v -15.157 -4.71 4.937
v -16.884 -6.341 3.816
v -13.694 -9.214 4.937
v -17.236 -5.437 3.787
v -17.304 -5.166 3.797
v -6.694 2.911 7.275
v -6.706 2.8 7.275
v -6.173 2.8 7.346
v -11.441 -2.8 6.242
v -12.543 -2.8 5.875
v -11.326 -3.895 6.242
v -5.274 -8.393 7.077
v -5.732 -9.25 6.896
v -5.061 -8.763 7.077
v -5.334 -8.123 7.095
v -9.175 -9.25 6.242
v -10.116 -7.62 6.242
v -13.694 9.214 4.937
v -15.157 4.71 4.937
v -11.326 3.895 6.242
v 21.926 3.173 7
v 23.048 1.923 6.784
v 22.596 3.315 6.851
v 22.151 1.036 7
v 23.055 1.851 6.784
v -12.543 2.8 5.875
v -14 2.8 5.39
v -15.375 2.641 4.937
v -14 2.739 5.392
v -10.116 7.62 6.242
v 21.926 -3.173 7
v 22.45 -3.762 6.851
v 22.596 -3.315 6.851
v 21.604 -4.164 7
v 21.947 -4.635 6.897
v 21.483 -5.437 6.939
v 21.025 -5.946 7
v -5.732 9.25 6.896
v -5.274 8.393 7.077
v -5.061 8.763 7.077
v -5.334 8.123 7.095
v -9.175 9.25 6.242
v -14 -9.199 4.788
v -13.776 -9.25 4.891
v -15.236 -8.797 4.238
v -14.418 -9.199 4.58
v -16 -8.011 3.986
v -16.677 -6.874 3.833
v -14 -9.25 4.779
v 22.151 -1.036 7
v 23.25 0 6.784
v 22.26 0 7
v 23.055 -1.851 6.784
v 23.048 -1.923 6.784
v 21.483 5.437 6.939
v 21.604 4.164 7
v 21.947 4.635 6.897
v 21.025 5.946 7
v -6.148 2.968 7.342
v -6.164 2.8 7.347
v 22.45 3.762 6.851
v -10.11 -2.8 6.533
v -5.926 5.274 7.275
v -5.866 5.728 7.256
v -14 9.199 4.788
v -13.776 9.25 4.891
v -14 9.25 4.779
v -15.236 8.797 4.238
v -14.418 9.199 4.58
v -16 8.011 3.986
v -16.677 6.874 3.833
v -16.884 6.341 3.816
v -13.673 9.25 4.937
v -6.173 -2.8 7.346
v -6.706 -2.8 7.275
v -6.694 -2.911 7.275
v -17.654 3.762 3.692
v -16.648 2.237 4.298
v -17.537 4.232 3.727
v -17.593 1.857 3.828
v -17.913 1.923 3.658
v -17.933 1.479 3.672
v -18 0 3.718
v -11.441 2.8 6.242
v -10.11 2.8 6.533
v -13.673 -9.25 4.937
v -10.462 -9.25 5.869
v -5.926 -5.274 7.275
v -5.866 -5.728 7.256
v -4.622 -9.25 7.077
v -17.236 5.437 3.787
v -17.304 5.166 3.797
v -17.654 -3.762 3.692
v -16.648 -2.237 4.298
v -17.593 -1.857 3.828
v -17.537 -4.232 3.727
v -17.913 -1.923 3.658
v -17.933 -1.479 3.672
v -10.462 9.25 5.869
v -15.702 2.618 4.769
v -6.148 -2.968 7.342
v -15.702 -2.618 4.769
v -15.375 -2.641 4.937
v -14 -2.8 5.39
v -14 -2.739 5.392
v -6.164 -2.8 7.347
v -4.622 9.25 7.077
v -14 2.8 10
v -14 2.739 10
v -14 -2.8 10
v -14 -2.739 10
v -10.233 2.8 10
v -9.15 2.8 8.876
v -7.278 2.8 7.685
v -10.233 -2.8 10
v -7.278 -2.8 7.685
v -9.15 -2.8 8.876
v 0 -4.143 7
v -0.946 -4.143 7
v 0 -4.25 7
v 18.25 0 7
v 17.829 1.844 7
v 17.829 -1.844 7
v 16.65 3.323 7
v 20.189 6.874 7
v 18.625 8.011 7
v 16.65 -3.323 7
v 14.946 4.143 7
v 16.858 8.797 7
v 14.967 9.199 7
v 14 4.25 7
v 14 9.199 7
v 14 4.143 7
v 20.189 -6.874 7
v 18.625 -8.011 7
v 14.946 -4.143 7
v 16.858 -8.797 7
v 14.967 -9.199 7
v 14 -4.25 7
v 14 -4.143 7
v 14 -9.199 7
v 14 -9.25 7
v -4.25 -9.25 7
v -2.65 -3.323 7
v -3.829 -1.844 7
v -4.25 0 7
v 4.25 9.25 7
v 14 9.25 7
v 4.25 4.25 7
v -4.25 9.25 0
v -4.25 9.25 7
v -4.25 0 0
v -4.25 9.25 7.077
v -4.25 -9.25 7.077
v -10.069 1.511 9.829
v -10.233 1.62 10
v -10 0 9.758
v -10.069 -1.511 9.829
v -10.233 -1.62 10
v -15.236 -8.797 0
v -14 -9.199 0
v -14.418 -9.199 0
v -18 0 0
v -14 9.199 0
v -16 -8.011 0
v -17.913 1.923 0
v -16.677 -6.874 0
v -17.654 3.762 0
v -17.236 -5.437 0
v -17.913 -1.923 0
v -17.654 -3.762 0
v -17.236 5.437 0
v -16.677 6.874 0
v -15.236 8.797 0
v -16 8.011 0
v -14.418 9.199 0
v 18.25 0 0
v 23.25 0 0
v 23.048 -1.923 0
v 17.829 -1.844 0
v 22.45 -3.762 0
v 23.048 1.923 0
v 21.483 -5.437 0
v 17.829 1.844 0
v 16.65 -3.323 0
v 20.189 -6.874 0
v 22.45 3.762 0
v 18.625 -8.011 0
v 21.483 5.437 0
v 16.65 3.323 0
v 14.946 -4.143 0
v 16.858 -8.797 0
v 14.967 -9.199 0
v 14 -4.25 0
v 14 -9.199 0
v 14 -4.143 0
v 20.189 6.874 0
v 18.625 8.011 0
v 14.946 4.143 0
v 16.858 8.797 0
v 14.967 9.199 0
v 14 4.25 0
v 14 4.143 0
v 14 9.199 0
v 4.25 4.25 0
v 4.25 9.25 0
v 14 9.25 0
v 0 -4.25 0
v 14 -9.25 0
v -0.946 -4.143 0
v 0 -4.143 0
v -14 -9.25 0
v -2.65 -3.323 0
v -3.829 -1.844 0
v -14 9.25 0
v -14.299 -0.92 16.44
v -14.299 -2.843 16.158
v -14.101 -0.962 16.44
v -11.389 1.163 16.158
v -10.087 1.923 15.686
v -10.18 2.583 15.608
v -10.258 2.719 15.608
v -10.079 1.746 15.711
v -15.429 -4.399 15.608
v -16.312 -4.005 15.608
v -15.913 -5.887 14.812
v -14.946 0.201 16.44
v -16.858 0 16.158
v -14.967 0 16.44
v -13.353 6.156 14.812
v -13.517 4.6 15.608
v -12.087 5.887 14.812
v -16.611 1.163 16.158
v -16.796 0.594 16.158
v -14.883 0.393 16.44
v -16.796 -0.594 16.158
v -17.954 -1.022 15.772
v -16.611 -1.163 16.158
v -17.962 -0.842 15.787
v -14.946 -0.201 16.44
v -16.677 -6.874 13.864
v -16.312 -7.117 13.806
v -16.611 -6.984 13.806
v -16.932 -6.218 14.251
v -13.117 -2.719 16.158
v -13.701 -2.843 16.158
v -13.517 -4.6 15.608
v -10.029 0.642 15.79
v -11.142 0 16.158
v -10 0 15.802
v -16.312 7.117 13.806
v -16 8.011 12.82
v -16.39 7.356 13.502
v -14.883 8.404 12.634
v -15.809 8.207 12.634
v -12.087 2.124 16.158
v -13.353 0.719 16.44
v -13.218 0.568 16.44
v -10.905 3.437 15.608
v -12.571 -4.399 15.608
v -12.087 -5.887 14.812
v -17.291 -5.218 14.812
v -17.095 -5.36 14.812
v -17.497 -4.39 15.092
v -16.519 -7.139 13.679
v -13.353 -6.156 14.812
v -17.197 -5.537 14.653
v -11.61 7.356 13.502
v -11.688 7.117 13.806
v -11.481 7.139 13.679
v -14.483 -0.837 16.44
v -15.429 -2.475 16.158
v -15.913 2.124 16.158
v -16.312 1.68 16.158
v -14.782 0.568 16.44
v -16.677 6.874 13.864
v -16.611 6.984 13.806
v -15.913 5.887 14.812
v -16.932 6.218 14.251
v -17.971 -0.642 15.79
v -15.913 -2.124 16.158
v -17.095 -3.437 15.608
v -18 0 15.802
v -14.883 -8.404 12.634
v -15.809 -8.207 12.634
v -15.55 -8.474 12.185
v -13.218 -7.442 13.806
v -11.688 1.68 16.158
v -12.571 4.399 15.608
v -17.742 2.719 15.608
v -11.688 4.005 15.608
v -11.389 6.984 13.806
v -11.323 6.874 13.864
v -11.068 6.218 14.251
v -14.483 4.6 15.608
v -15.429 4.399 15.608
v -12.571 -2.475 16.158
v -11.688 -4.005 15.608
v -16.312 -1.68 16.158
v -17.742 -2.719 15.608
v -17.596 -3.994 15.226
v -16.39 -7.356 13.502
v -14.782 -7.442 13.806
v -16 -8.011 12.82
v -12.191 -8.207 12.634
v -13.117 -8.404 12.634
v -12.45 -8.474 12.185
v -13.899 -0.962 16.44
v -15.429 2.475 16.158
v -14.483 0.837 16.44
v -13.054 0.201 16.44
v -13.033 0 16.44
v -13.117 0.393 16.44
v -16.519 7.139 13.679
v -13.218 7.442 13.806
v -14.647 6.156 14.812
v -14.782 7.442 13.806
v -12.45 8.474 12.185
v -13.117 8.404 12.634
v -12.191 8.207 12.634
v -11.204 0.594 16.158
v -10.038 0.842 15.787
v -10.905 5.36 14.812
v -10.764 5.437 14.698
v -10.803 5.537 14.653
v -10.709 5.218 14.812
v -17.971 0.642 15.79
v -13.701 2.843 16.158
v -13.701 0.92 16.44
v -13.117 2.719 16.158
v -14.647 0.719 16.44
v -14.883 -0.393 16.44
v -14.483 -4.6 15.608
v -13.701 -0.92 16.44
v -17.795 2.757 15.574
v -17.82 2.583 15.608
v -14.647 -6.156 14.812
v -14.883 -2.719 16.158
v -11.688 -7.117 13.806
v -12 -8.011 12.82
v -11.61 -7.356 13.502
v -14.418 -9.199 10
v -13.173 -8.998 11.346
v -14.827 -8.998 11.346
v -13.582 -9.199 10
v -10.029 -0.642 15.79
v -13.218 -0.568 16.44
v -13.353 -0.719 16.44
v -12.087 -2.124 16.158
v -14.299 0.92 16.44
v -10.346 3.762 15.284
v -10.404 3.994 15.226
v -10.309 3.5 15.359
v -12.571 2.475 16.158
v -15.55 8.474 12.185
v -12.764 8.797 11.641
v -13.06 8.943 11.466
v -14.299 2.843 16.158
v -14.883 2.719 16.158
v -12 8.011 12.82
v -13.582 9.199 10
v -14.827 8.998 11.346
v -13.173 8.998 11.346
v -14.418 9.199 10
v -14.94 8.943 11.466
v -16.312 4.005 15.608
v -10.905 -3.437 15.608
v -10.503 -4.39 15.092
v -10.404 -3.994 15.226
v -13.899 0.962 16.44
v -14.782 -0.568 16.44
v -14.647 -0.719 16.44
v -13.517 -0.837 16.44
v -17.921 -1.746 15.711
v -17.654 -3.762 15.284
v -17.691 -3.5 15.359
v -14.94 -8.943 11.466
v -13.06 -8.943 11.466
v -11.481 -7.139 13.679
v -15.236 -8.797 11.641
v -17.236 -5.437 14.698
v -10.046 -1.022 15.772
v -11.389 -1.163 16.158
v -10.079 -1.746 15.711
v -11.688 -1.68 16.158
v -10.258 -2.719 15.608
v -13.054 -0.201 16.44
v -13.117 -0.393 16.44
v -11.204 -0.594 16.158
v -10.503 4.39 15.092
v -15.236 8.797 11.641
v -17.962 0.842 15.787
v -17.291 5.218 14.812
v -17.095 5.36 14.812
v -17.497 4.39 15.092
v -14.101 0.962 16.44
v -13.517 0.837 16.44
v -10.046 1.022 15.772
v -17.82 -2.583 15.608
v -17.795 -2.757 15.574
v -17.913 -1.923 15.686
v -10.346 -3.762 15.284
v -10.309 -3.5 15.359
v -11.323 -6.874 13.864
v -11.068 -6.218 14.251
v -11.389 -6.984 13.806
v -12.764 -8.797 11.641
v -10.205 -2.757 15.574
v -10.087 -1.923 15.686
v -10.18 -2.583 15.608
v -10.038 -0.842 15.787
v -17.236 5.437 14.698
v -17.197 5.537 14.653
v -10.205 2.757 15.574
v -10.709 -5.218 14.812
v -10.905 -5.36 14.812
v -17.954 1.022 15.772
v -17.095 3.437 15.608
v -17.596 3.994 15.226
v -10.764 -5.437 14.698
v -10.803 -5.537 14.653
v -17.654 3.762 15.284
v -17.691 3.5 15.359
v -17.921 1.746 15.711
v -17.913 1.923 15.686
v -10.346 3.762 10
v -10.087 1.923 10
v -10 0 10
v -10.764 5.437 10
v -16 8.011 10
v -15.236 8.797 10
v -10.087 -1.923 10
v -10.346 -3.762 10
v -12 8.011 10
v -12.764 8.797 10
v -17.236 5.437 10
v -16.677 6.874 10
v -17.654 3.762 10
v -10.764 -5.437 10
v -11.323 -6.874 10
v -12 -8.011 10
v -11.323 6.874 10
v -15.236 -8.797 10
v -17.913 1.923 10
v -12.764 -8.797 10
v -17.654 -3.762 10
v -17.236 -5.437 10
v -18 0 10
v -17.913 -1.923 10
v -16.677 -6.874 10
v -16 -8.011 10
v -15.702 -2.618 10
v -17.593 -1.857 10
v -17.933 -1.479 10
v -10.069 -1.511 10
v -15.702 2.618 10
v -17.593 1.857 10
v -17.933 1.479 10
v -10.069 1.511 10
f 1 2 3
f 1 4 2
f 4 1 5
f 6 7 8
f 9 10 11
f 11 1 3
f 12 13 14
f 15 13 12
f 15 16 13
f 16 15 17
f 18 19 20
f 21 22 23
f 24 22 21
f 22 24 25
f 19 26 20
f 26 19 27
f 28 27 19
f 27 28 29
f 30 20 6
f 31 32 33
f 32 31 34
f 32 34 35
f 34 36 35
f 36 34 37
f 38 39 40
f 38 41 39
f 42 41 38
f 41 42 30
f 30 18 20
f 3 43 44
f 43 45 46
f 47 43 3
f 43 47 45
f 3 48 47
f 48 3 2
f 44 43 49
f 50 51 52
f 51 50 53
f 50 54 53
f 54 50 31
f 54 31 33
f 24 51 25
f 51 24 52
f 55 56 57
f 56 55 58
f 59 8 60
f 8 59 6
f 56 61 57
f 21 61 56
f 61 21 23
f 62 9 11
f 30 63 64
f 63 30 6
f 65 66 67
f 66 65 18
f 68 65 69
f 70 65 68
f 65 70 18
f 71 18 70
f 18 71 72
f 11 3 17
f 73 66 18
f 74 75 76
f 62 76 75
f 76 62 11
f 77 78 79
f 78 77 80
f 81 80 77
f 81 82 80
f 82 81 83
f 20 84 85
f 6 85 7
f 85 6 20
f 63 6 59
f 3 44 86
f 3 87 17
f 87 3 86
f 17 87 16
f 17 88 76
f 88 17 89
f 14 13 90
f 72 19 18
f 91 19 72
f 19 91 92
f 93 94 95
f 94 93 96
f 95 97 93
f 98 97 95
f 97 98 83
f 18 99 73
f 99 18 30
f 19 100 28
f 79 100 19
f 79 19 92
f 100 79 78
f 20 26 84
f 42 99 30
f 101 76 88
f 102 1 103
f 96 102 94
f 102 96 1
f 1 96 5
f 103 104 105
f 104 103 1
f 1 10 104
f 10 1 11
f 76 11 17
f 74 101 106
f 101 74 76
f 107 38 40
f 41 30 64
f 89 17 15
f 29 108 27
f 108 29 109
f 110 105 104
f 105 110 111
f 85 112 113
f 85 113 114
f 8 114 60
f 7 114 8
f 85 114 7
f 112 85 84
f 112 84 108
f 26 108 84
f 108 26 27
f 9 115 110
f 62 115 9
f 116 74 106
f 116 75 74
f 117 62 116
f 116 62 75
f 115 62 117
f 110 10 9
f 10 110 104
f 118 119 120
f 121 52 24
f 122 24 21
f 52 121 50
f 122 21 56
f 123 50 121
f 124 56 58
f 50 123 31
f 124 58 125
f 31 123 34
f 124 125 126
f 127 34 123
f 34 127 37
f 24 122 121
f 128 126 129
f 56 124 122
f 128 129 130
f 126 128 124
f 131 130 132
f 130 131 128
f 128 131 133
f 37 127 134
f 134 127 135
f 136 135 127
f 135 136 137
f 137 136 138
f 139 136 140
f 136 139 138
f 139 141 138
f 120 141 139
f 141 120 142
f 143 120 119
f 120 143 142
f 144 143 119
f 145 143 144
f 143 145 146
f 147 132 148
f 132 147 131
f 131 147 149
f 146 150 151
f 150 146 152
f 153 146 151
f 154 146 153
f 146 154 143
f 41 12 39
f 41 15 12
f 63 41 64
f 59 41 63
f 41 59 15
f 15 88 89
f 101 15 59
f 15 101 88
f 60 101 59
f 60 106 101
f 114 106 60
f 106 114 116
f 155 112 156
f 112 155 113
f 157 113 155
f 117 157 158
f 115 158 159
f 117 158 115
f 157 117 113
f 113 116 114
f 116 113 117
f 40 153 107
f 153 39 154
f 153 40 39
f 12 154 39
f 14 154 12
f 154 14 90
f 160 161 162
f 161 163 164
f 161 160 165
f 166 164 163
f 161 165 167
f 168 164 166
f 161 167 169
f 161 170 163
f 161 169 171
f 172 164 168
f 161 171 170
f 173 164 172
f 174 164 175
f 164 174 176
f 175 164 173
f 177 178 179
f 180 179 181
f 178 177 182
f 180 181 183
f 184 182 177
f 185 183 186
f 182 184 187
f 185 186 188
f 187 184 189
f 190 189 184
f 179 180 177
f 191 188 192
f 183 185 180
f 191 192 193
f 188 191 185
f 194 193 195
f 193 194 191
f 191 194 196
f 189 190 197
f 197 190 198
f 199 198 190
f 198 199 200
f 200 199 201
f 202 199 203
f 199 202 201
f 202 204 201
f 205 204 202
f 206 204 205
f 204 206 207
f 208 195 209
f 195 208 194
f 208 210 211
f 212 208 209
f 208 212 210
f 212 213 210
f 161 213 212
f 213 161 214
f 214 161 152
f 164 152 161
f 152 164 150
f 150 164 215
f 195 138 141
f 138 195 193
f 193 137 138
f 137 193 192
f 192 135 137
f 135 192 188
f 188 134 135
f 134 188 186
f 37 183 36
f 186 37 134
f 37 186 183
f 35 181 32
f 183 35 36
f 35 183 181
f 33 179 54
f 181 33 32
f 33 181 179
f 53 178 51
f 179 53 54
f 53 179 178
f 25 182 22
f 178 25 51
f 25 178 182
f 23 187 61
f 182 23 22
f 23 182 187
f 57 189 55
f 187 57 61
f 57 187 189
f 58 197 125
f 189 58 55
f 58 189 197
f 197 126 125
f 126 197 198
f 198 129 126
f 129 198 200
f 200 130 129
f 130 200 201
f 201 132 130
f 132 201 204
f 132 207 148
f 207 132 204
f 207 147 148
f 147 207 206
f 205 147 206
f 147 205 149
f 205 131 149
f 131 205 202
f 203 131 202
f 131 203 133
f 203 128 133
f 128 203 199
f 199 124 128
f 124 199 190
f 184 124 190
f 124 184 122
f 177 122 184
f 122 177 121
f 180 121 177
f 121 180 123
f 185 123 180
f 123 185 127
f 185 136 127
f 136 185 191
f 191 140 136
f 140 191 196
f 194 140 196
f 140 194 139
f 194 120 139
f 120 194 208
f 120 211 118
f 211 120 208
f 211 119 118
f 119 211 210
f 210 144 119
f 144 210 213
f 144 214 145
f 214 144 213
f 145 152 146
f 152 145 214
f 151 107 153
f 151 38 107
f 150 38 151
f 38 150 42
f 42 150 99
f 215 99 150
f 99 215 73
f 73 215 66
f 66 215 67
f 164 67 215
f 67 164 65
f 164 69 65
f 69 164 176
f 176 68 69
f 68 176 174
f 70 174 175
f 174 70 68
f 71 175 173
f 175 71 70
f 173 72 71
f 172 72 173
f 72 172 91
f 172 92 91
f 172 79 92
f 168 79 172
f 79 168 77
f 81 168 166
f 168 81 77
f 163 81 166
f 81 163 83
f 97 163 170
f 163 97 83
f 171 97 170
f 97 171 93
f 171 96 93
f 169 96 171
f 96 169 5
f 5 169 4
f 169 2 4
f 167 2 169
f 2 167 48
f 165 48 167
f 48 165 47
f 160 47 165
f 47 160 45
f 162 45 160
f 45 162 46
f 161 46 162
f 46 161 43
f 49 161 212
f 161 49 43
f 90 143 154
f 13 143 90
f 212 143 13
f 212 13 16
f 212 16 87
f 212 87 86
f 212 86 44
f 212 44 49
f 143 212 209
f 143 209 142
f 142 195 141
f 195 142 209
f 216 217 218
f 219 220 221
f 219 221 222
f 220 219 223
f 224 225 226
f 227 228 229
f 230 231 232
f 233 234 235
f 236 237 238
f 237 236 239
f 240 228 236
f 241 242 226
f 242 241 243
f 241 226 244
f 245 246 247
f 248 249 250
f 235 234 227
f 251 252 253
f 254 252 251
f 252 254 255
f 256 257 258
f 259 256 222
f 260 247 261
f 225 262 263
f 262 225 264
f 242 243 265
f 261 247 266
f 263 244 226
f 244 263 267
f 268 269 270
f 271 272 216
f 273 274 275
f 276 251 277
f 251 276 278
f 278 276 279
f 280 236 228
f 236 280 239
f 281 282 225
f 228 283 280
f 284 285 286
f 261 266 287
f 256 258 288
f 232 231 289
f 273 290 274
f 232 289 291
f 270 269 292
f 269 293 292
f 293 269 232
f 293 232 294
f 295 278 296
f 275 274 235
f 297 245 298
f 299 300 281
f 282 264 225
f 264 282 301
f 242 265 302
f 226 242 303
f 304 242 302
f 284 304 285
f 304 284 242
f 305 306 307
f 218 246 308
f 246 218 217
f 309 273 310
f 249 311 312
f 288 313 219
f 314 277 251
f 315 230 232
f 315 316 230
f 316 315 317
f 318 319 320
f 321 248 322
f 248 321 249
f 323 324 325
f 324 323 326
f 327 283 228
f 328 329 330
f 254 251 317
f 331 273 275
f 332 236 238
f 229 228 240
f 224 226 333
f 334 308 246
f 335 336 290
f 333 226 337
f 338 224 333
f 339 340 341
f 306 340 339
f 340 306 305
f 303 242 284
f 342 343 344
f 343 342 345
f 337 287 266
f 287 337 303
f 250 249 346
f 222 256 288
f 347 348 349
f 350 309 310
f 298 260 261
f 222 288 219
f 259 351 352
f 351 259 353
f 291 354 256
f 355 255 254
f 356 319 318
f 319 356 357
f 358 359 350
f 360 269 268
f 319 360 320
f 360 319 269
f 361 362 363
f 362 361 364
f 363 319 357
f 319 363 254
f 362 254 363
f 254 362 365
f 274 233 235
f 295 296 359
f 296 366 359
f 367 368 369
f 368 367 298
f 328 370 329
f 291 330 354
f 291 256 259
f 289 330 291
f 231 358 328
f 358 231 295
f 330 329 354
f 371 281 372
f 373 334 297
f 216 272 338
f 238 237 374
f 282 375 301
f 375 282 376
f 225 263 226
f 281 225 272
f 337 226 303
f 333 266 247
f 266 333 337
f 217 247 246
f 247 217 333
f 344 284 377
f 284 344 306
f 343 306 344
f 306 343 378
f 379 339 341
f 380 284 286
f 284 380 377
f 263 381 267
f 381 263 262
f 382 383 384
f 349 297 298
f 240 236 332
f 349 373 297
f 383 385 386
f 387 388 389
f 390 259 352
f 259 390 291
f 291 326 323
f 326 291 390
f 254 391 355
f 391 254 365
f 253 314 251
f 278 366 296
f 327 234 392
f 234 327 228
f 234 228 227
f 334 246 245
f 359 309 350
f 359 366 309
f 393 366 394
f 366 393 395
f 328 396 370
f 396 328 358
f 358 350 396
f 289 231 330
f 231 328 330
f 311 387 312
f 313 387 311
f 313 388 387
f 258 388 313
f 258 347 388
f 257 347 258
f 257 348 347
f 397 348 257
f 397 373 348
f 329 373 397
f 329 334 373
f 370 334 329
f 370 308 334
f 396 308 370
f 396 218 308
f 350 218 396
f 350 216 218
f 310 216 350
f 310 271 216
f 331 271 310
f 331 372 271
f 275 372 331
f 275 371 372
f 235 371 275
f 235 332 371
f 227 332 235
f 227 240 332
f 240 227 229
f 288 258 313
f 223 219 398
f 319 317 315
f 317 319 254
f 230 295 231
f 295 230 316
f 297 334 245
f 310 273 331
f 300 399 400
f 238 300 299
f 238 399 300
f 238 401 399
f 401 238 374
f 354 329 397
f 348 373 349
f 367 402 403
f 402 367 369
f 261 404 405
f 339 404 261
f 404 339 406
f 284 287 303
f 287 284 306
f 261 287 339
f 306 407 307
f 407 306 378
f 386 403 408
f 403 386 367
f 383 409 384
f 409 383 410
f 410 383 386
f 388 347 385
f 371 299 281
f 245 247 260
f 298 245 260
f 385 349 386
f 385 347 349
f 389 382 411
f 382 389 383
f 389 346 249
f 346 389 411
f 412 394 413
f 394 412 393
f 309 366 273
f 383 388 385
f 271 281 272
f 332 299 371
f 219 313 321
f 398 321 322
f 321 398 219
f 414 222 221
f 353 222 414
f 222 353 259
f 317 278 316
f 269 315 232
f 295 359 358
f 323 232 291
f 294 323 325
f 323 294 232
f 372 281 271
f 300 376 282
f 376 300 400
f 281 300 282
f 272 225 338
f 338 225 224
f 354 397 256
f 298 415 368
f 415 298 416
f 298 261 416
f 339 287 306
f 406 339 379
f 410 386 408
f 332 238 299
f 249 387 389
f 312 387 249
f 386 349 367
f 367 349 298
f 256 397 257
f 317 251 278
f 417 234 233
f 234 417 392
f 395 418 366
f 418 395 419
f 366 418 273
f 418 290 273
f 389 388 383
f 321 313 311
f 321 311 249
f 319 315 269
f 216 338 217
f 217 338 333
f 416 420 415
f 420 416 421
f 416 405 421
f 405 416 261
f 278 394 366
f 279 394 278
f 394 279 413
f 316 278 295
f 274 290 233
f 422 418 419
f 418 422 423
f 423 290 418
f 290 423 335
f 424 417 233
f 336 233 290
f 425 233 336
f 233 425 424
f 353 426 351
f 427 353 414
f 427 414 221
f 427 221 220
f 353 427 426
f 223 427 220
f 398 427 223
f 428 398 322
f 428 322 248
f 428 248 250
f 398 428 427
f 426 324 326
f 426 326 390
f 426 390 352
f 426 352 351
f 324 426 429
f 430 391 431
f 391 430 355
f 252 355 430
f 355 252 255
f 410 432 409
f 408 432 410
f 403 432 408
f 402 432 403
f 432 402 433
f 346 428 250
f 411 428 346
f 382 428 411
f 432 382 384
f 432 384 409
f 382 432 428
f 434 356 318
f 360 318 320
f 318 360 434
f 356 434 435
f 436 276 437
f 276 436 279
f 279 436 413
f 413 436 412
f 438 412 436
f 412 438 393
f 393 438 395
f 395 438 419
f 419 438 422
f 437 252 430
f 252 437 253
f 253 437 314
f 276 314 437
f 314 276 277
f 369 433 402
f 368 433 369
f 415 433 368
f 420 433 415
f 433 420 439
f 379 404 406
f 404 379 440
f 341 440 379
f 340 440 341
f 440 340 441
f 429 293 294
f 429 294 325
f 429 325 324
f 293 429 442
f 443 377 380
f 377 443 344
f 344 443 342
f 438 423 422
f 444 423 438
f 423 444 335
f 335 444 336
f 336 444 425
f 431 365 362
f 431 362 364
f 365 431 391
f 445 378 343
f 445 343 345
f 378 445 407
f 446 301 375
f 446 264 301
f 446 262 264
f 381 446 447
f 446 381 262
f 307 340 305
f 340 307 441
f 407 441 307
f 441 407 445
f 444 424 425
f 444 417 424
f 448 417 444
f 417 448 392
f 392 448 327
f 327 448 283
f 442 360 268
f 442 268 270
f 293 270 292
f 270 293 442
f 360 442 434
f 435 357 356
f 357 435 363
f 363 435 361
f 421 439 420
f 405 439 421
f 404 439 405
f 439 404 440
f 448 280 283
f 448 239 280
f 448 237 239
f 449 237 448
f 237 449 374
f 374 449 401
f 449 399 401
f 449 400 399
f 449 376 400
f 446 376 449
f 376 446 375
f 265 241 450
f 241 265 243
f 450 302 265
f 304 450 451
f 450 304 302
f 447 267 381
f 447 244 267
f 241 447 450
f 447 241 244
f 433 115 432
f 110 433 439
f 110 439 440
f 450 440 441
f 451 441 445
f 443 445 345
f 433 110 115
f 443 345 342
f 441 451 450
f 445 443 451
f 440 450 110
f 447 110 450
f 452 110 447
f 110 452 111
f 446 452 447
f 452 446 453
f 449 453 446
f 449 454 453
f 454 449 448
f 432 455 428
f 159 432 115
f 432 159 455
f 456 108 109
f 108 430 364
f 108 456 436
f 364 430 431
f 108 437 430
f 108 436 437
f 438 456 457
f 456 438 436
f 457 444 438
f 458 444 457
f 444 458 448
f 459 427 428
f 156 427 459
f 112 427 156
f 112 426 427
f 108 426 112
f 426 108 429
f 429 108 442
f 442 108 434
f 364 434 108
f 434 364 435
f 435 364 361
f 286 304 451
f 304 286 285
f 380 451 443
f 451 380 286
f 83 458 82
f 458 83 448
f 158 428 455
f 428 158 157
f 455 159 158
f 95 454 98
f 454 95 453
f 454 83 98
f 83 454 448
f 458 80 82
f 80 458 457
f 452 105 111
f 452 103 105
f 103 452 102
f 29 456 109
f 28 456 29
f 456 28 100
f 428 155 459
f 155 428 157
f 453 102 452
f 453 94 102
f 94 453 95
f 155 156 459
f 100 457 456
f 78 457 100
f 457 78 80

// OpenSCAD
//
//  Copyright (C) 01-08-2013 Jasper den Ouden.
//
//  This is free software: you can redistribute it and/or modify
//  it under the terms of the GNU General Public License as published
//  by the Free Software Foundation, either version 3 of the License, or
//  (at your option) any later version.
//

r = 8.5/2;
t=5;

sl = 8;
l=28;
w= 2*(r+t);

h = 7;
ch = 3;

module profile()
{
    difference()
    {
        union()
        {   square([l,w],center=true);
            translate([l/2,0]) circle(r+t);
            translate([-l/2,0]) scale([sl/(2*(r+t)),1]) circle(r+t);
        }
        translate([l/4,0]) square([l/2,2*r],center=true);
        translate([0,w]) square([2*r,2*w],center=true);
        circle(r);
        
        translate([l/2,0]) circle(r);
    }
}

module pants_holder()
{
    union()
    {   intersection()
        {   linear_extrude(height=2*h) profile();
            difference()
            {   union()
                {   translate([l/4,0]) scale([1,1,0.3]) sphere(l);
                    cube([l,sl*0.7,3*h],center=true);
                }
                translate([l-r,0,h+l]) cube(l*[2,2,2],center=true);
                translate([-r,w,h+l/2]) rotate([90,0,0]) scale([0.7,1,1]) 
                    cylinder(r=l/2,h=3*w);
            }
        }
        translate([-l/2,0]) linear_extrude(height=h+ch) intersection()
        {   scale([1.2,0.7]) circle(sl/2);
            scale([sl/(2*(r+t)),1]) circle(r+t);
        }
        translate([-l/2,0,h+ch]) intersection()
        {   scale([1,1,0.7]) sphere(r+t);
            scale([sl/(2*(r+t)),1]) cylinder(r=r+t,h=h);
        }
    }
}

pants_holder();
